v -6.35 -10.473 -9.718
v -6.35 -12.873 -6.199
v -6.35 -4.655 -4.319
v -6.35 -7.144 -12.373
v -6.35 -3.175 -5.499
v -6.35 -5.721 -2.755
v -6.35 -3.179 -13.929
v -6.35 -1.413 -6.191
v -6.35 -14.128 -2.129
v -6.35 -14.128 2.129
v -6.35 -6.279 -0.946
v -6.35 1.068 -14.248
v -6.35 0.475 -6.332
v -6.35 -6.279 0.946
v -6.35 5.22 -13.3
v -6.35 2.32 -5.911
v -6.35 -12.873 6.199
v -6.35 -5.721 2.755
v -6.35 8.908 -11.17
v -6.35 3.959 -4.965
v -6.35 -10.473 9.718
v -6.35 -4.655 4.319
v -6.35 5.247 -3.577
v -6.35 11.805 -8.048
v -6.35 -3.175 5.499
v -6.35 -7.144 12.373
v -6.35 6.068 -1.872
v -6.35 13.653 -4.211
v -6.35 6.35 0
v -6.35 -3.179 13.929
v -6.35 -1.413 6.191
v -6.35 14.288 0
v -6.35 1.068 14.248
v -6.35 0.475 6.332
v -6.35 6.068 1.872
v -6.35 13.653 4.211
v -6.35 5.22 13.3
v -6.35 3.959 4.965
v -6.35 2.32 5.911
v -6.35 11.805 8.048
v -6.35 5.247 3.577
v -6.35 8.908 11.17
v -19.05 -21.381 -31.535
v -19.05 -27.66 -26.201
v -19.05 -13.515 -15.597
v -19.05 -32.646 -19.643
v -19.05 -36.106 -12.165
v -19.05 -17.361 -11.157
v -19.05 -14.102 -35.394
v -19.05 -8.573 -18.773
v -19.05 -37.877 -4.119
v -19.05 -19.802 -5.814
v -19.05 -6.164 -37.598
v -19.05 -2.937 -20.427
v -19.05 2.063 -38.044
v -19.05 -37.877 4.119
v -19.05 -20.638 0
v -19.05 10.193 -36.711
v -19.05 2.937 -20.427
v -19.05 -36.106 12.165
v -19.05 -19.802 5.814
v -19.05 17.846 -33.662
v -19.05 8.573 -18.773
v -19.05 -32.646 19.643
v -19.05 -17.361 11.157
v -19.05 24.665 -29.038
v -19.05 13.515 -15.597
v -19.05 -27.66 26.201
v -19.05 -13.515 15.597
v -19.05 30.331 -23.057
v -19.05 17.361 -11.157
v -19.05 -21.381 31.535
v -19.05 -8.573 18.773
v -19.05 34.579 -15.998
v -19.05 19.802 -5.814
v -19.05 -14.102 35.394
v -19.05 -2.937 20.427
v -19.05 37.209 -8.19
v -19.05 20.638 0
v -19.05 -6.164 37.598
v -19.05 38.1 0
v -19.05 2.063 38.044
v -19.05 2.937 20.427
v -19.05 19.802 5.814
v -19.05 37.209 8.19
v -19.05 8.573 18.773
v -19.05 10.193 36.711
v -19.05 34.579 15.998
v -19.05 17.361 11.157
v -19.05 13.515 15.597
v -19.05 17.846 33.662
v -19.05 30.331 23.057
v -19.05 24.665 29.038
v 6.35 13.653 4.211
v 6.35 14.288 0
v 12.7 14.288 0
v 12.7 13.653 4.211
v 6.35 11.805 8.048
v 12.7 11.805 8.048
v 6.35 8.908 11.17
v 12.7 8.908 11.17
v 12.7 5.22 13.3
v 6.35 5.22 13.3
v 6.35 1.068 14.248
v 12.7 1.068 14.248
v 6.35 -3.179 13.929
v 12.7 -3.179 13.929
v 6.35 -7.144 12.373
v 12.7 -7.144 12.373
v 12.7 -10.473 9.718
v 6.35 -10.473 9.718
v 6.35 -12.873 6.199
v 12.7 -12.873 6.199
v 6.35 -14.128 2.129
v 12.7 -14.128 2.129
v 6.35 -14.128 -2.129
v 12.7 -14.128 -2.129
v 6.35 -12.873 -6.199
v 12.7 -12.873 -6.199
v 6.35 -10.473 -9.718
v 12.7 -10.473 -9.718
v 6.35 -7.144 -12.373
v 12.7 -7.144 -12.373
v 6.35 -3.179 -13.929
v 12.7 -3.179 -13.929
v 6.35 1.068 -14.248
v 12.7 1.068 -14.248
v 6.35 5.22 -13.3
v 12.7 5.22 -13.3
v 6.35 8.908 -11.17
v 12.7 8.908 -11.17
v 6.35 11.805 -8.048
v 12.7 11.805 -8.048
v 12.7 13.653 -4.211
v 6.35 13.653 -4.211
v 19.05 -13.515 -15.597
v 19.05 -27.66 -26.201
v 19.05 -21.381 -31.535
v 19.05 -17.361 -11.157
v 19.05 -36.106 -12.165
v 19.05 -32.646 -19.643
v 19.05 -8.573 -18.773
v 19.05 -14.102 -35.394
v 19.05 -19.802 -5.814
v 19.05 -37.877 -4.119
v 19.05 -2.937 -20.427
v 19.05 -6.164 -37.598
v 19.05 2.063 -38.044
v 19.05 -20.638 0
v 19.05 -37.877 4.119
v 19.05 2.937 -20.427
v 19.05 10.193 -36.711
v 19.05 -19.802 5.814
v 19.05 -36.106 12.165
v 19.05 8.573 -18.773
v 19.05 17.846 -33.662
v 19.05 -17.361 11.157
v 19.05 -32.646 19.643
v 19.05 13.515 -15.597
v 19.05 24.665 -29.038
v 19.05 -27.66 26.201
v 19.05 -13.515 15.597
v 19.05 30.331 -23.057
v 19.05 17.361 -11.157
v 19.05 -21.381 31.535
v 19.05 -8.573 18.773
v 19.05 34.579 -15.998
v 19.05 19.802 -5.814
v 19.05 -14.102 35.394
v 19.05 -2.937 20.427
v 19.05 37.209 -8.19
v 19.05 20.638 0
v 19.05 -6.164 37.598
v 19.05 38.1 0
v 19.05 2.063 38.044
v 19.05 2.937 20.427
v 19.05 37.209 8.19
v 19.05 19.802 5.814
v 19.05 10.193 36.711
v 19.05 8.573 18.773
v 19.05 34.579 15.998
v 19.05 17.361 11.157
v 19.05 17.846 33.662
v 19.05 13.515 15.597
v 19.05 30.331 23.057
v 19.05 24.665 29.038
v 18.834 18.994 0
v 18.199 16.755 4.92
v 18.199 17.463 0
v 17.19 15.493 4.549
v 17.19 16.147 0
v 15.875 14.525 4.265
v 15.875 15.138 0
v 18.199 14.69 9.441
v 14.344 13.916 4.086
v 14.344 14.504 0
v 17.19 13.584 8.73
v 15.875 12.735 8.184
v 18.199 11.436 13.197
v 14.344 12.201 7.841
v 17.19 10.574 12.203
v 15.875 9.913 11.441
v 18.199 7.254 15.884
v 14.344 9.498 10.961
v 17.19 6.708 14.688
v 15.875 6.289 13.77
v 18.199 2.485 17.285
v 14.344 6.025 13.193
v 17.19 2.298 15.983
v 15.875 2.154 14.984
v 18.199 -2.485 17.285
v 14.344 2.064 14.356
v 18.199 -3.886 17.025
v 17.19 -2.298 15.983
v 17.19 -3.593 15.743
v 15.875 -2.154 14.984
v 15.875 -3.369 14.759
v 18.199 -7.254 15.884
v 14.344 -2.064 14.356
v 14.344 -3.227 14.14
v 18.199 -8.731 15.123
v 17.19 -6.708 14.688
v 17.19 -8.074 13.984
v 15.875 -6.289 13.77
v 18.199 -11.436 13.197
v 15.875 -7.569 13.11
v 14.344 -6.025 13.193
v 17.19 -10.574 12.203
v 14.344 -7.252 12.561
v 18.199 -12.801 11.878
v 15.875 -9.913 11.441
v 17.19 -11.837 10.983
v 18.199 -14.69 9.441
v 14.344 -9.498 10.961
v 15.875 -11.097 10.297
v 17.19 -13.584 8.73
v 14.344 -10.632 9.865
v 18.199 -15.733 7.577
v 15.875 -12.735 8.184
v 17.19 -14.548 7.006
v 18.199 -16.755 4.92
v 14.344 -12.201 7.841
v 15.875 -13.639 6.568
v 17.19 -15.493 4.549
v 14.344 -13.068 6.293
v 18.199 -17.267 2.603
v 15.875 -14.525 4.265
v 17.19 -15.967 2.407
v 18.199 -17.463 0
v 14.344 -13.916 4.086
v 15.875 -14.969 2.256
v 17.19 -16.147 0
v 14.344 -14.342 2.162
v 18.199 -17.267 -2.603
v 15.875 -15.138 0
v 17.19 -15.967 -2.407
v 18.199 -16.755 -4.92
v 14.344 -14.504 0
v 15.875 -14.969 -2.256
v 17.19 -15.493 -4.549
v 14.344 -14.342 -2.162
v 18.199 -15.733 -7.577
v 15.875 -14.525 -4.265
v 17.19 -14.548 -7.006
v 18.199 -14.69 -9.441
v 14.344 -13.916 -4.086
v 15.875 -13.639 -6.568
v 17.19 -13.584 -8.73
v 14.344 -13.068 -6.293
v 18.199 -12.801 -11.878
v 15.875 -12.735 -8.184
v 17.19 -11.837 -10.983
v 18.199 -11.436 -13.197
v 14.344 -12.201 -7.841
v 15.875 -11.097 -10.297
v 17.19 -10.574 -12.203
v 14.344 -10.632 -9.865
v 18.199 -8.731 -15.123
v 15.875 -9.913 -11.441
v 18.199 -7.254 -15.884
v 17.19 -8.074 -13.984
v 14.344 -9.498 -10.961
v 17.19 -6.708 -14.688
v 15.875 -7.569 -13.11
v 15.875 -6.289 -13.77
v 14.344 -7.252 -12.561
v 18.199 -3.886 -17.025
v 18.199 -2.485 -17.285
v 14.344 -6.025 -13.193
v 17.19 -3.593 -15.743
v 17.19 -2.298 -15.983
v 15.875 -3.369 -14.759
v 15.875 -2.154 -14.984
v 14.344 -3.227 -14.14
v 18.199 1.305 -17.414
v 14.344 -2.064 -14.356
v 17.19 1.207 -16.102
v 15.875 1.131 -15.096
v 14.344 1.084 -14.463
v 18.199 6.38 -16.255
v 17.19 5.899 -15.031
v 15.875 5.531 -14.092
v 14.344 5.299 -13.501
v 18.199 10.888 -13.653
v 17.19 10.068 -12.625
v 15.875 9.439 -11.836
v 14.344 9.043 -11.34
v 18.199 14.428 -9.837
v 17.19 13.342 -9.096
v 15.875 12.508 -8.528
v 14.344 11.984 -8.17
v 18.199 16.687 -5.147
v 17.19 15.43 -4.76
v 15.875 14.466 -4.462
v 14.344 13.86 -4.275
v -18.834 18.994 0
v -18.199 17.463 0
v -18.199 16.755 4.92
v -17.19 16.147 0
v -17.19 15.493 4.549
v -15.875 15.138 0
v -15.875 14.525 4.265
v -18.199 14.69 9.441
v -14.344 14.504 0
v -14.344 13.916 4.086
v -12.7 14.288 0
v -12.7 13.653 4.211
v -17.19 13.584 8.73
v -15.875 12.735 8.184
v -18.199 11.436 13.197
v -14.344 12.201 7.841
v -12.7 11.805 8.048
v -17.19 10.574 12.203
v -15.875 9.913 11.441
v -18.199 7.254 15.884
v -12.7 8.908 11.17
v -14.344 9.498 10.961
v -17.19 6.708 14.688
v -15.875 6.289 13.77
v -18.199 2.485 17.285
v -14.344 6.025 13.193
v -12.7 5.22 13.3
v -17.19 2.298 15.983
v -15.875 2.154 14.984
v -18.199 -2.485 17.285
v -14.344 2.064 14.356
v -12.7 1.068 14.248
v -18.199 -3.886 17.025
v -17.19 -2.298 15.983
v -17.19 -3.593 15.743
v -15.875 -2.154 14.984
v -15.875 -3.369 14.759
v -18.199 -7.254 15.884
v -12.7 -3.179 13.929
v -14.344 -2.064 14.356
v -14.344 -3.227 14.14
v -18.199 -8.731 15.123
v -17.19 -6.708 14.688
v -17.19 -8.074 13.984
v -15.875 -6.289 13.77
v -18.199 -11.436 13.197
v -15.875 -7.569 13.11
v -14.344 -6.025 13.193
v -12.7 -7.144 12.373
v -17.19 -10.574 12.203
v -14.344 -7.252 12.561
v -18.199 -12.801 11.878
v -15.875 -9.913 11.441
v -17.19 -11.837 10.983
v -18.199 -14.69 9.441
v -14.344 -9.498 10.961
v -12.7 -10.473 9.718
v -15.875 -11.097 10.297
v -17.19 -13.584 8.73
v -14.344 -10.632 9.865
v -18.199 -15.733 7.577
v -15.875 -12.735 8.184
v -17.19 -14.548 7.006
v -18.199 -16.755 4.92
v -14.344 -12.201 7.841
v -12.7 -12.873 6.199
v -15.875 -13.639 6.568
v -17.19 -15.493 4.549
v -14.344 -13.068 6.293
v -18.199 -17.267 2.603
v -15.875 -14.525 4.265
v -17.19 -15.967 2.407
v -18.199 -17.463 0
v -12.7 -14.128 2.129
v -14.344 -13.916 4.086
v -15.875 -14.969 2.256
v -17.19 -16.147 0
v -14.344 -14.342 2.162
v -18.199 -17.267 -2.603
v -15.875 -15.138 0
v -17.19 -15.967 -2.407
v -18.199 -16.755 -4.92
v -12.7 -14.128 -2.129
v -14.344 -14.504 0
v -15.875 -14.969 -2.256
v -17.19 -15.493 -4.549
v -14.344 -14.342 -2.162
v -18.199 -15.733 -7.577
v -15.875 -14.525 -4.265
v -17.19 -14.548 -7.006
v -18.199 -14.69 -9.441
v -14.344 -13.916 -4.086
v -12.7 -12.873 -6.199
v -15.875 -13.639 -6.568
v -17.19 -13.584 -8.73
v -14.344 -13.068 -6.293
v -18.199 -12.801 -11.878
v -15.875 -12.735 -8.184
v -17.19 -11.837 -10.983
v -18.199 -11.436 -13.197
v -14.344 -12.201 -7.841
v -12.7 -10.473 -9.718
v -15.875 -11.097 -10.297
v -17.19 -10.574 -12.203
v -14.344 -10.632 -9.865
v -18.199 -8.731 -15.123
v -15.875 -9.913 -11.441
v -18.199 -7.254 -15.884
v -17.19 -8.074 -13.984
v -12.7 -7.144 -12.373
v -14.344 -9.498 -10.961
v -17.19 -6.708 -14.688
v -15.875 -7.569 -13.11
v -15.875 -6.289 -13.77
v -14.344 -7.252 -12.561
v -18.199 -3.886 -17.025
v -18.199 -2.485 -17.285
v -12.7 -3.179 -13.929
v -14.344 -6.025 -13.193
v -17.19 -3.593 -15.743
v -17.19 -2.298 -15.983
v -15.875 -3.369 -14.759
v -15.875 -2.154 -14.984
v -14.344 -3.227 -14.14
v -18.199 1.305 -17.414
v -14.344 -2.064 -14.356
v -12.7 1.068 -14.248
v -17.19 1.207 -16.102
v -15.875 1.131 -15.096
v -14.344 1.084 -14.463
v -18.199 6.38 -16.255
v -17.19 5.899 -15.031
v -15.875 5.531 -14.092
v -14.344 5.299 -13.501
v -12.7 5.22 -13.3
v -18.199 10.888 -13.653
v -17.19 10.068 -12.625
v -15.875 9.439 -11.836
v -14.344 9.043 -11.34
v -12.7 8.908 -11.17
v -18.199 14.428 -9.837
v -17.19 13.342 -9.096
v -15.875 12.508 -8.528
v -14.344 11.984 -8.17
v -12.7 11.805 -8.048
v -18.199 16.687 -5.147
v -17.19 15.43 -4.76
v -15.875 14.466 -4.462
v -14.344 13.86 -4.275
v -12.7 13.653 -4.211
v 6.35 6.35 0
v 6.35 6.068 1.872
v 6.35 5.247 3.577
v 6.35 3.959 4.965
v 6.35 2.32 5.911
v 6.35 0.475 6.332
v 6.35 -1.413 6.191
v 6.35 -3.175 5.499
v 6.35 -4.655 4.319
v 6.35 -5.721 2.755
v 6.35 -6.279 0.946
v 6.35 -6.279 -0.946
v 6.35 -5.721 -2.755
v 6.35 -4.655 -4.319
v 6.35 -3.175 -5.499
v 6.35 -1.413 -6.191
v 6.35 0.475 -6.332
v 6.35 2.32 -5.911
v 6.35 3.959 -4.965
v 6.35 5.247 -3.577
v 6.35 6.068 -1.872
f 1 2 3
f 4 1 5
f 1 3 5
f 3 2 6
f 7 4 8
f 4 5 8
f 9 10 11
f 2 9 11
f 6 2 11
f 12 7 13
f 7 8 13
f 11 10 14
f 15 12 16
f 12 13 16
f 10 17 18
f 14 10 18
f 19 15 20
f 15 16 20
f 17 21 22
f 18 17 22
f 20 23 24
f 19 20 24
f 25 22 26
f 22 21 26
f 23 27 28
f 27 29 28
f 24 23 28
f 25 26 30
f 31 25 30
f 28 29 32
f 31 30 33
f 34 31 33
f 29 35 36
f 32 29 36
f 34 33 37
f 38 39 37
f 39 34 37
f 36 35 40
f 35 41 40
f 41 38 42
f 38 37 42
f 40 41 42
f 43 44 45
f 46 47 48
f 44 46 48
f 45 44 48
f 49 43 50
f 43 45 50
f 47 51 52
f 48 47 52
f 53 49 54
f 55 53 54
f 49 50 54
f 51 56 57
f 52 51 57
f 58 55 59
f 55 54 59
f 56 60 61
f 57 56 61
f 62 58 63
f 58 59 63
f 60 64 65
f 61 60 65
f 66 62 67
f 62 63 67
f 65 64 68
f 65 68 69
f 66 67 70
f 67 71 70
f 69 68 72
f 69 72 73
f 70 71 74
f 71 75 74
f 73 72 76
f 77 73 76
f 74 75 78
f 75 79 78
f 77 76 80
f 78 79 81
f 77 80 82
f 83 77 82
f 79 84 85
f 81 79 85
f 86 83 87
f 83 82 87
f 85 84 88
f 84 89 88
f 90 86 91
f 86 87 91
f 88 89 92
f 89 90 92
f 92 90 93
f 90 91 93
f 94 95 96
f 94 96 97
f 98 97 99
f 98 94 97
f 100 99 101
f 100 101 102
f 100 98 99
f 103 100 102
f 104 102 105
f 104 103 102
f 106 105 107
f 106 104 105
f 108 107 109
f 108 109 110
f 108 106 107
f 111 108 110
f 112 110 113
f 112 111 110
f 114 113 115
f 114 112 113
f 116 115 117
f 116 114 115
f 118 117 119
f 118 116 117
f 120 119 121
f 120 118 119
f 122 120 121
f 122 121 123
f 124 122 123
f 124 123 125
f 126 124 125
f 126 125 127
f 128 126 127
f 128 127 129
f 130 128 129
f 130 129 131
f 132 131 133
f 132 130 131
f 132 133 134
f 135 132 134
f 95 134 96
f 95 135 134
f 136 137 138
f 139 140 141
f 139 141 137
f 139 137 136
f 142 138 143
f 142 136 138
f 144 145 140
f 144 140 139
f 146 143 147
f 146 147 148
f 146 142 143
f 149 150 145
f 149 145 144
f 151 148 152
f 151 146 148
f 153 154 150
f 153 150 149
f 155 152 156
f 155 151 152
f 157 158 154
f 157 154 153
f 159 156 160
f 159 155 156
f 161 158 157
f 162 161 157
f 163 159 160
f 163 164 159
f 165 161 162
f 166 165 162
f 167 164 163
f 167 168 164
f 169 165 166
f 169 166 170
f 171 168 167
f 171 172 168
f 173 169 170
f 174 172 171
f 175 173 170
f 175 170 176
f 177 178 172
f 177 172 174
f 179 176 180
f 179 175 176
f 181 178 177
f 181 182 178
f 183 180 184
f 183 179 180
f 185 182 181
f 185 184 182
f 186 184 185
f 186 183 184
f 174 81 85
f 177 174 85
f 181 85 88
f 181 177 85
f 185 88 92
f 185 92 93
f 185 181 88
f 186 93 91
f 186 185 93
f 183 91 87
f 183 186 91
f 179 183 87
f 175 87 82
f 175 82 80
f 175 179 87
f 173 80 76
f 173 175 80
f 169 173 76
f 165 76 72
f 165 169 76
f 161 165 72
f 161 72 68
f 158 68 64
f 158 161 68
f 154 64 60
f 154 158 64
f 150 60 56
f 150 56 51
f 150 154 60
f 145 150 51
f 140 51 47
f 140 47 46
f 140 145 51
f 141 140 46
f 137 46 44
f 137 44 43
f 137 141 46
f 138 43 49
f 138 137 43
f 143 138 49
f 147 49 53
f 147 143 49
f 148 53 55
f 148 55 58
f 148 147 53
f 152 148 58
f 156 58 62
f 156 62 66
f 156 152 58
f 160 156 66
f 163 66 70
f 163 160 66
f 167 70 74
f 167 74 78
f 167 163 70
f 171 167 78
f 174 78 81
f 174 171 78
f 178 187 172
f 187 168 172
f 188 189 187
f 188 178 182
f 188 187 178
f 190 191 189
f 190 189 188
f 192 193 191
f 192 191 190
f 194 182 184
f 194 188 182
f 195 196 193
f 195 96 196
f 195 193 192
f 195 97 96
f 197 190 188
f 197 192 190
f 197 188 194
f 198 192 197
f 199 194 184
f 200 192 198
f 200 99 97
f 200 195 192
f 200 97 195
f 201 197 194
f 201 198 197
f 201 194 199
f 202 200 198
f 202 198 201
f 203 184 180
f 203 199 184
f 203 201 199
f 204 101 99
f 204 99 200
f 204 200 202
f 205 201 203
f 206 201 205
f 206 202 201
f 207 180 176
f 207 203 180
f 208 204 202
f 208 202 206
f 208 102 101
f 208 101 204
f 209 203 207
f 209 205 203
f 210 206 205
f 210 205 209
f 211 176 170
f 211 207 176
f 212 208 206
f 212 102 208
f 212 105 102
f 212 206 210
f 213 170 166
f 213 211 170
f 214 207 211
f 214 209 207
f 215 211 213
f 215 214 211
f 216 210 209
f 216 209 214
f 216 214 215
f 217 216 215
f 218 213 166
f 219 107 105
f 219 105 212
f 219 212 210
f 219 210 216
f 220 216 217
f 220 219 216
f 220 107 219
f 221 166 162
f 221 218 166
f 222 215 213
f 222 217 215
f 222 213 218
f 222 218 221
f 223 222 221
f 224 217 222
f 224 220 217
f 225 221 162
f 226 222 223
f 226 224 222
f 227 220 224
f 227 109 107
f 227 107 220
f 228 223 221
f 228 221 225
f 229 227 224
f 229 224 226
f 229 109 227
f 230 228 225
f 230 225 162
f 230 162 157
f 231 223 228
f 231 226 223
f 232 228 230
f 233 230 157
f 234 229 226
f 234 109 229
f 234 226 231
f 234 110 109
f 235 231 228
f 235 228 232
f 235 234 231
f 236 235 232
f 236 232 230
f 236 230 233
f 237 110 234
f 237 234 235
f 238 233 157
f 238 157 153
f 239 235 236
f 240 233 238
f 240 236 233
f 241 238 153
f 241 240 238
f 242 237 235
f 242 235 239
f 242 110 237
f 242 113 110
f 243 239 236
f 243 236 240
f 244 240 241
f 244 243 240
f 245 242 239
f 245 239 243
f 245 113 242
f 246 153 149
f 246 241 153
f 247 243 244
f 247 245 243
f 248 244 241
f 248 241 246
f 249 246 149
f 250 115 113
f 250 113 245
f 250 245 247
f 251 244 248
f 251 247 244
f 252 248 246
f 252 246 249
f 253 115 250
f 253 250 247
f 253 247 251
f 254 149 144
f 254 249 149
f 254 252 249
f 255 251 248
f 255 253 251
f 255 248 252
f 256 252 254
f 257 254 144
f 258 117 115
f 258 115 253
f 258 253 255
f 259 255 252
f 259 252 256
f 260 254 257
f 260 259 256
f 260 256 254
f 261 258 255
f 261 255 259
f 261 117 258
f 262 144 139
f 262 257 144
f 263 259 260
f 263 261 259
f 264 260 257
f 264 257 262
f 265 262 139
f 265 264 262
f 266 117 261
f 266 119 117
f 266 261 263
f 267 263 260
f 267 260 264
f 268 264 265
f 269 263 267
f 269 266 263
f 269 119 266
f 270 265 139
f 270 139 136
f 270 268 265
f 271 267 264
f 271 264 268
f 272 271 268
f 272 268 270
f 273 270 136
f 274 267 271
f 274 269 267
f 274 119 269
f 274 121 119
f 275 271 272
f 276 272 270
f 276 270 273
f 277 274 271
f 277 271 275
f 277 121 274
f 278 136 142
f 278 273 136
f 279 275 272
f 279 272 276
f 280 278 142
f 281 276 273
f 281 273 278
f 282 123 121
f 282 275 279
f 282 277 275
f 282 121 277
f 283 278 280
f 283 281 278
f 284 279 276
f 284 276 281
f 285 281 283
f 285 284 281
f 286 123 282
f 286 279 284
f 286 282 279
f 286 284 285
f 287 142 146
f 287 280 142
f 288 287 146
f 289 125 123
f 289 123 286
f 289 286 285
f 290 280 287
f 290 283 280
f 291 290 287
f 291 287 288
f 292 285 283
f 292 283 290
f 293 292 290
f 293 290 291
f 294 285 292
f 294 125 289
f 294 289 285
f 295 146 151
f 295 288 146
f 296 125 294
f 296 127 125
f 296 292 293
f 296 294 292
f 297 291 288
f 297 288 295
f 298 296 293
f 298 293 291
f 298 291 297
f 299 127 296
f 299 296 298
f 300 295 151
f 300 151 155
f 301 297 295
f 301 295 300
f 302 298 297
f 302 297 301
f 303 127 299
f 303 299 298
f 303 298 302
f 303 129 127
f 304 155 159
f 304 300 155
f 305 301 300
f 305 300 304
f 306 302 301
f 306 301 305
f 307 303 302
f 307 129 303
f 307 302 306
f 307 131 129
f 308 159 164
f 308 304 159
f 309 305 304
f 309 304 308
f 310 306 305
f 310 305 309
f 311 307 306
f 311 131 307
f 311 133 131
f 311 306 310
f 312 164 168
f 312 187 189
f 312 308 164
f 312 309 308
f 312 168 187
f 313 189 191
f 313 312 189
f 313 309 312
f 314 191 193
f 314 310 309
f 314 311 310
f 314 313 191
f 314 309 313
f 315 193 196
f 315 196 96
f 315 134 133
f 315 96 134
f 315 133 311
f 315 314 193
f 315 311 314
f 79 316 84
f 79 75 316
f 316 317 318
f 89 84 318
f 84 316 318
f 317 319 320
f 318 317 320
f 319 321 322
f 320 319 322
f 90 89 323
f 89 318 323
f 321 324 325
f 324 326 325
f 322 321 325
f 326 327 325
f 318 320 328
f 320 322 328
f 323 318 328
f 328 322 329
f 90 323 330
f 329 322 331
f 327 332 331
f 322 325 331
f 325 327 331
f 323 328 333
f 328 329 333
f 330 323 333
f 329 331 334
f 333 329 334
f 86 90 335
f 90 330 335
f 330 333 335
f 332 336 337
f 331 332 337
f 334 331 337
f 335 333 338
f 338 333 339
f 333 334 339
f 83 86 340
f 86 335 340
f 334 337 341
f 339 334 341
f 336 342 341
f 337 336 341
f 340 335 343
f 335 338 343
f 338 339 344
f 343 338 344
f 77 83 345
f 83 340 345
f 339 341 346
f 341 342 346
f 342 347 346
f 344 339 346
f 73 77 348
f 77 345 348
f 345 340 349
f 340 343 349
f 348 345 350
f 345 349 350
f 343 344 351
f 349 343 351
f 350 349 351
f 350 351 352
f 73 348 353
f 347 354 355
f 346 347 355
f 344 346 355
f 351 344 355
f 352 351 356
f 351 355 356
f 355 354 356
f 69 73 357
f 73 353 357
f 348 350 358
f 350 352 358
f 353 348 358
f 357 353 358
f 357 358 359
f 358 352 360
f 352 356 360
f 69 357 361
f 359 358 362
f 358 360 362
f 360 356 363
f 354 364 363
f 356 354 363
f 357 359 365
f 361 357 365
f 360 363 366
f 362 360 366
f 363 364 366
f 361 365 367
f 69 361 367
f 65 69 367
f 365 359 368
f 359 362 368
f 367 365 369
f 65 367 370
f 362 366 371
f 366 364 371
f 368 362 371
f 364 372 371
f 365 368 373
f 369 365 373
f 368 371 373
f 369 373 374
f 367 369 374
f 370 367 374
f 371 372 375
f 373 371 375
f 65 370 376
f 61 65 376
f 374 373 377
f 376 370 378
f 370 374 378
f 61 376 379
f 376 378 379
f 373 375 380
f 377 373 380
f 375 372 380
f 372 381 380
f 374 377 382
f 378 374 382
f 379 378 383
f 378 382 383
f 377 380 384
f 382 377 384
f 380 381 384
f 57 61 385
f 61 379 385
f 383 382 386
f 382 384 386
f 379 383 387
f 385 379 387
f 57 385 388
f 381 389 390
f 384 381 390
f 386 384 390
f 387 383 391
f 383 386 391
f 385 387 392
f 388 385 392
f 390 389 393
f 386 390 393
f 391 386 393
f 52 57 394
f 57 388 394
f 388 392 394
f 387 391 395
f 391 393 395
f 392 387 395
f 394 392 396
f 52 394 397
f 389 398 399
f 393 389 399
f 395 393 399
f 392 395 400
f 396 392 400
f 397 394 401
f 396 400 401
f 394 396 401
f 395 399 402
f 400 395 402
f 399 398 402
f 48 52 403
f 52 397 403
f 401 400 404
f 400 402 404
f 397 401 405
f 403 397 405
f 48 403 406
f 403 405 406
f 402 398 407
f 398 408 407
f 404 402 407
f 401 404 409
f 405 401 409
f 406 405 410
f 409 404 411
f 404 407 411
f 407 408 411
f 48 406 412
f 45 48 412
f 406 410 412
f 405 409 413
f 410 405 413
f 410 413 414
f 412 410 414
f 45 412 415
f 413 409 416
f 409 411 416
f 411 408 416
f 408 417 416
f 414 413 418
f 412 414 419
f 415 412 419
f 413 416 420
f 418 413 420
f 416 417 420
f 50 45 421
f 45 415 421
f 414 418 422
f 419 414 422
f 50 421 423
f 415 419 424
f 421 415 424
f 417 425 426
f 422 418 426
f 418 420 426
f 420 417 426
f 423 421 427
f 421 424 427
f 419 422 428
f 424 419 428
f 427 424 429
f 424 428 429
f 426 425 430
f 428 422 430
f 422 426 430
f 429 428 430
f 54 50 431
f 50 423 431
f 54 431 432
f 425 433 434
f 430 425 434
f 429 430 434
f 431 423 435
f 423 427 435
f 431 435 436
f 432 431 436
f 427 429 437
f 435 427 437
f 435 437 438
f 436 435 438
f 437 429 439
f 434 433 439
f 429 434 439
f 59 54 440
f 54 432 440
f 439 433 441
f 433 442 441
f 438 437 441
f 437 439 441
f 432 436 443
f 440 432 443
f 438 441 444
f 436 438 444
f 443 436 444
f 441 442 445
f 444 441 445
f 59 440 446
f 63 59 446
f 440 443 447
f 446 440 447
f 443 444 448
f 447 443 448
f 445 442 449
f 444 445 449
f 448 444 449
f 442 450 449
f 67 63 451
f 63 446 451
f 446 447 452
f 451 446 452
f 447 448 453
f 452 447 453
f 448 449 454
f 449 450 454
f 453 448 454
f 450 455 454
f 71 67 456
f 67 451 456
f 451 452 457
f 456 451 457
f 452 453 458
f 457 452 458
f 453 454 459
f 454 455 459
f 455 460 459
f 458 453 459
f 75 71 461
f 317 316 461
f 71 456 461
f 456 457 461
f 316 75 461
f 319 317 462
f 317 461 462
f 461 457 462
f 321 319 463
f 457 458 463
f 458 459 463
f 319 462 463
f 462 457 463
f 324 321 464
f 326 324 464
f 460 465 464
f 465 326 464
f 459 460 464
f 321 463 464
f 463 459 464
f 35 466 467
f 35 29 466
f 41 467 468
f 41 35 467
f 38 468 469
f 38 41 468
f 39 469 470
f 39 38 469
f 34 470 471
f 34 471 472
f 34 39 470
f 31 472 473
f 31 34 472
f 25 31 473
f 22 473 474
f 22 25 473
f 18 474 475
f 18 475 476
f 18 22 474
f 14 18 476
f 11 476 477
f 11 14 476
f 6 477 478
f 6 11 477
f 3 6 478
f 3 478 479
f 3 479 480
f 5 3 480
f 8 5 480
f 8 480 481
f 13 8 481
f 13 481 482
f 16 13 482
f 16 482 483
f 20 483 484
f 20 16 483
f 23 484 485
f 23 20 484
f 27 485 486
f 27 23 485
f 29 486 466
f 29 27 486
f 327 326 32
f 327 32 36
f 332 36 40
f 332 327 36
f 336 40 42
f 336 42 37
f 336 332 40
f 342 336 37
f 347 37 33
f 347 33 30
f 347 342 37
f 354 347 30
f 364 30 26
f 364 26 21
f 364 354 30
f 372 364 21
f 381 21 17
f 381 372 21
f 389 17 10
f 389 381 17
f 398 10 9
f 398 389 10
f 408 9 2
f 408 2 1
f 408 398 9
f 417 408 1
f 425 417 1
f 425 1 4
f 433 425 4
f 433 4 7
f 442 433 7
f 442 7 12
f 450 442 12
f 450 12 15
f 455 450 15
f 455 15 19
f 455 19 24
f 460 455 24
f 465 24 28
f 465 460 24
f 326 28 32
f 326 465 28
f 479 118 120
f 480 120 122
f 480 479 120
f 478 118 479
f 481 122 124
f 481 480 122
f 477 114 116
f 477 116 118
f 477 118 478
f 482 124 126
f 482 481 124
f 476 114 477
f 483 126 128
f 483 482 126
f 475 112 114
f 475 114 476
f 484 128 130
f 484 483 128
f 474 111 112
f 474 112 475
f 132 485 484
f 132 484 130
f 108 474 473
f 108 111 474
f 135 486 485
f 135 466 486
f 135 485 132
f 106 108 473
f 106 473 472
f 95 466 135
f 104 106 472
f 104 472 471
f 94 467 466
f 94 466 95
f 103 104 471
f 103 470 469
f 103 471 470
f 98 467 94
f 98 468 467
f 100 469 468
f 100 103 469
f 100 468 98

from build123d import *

# Parameters (mm, degrees)
F0_R     = 38.1
F0_R_2   = 14.2875
F1_DEPTH = 19.05
F0_R_3   = 6.35
F2_DEPTH = 6.35
F3_R     = 6.35


with BuildPart() as f1:
    # F0 (on Right) → F1 (new body, symmetric)
    with BuildSketch(Plane.YZ):
        Circle(F0_R)
        Circle(F0_R_2, mode=Mode.SUBTRACT)
    extrude(amount=F1_DEPTH, both=True)

    # F0 (on Right) → F2 (join, symmetric)
    with BuildSketch(Plane.YZ):
        Circle(F0_R_2)
        Circle(F0_R_3, mode=Mode.SUBTRACT)
    extrude(amount=F2_DEPTH, both=True)

    # F3
    f3_edges = [f1.edges().sort_by_distance(p)[0] for p in [
        (-19.05, -14.2875, 0),
        (19.05, -14.2875, 0),
    ]]
    fillet(f3_edges, radius=F3_R)


solid = f1.part
